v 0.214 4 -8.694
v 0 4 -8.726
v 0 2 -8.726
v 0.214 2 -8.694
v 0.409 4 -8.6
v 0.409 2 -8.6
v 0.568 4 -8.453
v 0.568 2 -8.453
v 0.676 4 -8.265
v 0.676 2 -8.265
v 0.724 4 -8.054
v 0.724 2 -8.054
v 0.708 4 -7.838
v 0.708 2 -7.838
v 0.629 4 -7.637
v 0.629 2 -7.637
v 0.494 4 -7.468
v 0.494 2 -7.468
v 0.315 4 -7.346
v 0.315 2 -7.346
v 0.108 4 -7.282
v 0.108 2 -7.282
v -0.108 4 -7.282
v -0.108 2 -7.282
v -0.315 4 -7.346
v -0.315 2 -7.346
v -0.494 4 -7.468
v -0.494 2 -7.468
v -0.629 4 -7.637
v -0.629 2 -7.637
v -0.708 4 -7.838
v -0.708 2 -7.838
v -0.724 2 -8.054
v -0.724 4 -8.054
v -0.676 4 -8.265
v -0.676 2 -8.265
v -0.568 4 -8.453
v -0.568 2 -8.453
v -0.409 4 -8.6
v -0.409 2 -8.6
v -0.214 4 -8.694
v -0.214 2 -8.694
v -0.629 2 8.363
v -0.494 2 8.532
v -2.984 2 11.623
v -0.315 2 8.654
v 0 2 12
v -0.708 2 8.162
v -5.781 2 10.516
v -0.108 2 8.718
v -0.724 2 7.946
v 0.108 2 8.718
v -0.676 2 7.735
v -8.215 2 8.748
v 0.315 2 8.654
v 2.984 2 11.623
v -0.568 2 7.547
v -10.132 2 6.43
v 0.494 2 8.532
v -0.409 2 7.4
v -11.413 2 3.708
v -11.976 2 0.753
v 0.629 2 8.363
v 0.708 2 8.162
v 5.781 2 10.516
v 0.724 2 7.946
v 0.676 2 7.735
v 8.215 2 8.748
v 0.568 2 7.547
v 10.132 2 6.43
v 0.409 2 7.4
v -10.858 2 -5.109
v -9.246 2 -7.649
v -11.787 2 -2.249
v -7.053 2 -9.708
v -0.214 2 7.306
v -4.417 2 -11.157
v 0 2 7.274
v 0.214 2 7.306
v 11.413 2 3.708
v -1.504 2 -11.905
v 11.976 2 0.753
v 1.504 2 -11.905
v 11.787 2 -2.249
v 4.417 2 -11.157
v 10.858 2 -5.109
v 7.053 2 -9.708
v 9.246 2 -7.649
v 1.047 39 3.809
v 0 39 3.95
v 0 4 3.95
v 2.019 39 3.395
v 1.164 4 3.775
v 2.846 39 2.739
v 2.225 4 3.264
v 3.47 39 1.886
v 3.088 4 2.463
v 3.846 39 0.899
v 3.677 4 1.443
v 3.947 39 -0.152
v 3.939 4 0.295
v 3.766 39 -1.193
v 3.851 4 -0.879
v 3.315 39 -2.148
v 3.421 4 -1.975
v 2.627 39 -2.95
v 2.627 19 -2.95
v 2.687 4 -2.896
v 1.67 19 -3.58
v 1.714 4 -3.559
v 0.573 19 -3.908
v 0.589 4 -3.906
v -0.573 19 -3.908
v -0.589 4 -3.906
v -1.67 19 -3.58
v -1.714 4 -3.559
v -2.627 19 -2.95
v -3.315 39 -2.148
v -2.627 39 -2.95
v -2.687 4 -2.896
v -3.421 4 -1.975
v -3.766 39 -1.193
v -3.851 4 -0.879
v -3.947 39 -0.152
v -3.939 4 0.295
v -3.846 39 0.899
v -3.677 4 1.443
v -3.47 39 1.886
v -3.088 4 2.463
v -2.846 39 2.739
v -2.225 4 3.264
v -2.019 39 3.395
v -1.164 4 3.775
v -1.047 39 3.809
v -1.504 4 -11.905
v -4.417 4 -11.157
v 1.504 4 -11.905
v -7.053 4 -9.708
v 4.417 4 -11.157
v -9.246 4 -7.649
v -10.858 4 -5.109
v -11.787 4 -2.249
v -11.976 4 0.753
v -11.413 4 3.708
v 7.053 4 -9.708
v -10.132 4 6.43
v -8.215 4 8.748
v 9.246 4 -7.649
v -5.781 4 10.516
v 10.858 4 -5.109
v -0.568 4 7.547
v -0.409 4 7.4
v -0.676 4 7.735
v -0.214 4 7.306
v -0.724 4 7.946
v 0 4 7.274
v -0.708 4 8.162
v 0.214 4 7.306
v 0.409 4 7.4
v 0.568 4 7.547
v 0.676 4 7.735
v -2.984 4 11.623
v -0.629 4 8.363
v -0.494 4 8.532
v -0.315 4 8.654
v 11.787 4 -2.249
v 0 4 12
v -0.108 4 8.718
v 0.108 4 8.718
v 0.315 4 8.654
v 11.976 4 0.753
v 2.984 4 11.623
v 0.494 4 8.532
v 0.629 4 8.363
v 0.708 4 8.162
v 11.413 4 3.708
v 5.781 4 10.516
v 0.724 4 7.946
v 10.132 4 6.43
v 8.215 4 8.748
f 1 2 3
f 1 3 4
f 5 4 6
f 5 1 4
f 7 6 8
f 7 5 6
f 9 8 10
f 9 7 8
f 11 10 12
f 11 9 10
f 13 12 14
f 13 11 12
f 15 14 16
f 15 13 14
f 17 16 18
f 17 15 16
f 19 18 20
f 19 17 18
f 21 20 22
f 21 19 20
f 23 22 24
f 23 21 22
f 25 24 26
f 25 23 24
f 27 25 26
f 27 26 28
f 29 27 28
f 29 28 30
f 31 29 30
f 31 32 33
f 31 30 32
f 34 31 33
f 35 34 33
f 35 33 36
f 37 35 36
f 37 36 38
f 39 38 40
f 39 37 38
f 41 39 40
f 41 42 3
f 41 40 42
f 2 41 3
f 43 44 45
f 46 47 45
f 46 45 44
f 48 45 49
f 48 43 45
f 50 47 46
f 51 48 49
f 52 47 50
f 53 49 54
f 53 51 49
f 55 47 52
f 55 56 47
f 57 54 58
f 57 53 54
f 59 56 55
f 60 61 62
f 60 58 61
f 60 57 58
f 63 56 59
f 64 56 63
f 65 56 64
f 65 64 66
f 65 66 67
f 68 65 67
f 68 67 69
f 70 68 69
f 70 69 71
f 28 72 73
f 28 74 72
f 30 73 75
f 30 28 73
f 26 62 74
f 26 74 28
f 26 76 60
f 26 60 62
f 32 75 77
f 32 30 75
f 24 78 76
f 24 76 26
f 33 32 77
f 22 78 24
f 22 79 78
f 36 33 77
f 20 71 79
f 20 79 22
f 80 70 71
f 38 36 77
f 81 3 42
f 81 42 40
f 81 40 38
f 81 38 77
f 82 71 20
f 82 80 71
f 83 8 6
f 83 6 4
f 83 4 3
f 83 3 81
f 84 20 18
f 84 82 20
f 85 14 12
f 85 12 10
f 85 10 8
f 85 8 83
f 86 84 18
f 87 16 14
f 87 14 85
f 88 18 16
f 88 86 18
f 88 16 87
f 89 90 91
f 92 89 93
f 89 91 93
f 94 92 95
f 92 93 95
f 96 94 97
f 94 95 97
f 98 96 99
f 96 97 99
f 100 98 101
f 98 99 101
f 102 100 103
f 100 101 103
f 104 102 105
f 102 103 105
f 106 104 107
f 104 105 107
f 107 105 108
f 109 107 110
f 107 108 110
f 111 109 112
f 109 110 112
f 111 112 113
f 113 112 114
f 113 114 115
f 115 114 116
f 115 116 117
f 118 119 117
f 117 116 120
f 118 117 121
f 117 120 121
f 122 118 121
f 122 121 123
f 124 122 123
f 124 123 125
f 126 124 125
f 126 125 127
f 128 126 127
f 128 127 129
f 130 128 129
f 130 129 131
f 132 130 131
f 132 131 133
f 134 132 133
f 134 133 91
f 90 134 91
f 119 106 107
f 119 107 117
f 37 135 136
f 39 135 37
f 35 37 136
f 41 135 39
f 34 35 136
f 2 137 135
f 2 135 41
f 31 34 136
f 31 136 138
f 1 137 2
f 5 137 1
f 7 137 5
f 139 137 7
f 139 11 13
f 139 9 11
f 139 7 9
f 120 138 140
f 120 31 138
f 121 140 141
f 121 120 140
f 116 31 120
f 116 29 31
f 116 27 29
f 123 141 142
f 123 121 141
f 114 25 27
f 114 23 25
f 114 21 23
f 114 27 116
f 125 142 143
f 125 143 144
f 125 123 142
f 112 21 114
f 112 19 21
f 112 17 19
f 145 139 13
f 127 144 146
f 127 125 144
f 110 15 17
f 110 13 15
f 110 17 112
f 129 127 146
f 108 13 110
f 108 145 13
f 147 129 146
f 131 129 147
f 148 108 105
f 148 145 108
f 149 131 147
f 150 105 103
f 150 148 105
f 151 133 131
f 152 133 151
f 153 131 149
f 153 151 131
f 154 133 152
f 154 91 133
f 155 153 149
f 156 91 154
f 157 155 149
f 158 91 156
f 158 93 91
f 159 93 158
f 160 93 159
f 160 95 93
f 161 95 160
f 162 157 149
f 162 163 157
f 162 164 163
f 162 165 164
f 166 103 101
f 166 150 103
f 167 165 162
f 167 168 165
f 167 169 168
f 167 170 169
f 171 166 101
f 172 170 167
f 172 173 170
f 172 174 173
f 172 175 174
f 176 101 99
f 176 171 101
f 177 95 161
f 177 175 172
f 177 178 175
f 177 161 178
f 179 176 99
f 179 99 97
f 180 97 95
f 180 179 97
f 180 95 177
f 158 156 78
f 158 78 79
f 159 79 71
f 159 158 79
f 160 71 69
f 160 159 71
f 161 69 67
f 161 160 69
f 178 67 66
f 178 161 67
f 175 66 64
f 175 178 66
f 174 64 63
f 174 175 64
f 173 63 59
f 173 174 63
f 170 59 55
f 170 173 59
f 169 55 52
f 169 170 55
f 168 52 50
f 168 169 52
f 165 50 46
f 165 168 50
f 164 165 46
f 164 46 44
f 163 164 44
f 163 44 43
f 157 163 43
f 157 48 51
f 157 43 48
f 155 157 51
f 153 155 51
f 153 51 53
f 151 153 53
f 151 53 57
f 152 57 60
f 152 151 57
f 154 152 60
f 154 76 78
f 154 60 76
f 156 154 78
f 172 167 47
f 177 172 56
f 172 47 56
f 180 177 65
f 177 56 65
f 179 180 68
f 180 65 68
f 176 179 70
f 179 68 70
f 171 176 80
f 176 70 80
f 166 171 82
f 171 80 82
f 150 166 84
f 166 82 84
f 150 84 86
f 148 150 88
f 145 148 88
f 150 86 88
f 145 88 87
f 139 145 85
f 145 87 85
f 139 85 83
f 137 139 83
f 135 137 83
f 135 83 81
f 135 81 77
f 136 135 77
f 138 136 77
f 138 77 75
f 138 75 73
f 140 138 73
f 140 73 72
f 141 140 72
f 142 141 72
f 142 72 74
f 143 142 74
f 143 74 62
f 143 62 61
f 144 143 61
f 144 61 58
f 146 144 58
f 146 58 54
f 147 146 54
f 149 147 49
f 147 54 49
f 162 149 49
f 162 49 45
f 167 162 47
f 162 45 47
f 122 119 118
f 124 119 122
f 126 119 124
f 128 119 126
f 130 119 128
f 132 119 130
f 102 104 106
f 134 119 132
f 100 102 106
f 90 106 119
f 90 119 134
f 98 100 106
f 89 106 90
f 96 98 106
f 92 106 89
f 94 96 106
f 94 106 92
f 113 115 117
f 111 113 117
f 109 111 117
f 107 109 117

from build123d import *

# Parameters (mm, degrees)
CROQUIS3_R                 = 12
SALIENTE_EXTRUIR1_DEPTH    = 4
CROQUIS4_R                 = 3.95
SALIENTE_EXTRUIR2_DEPTH    = 35
CORTAR_EXTRUIR1_START      = -20
CORTAR_EXTRUIR1_DEPTH      = 20
CROQUIS7_R                 = 12
CORTAR_EXTRUIR2_DEPTH      = 2
CORTAR_EXTRUIR3_DEPTH      = 41.706264874
CORTAR_EXTRUIR3_DEPTH_BACK = 41.706264874
CROQUIS8_R                 = 0.726366889


with BuildPart() as part:
    # Croquis3 → Saliente-Extruir1 (new body)
    with BuildSketch(Plane(origin=(0, 0, 0), x_dir=(1, 0, 0), z_dir=(0, 1, 0))):
        with Locations(Location((0, 0, 0), (0, 0, 270))):
            Circle(CROQUIS3_R)
    extrude(amount=SALIENTE_EXTRUIR1_DEPTH)

    # Croquis4 → Saliente-Extruir2 (add)
    with BuildSketch(Plane(origin=(0, 4, 0), x_dir=(1, 0, 0), z_dir=(0, 1, 0))):
        with Locations(Location((0, 0, 0), (0, 0, 270))):
            Circle(CROQUIS4_R)
    extrude(amount=SALIENTE_EXTRUIR2_DEPTH)

    # Croquis5 → Cortar-Extruir1 (cut)
    with BuildSketch(Plane(origin=(0, 39, 0), x_dir=(1, 0, 0), z_dir=(0, 1, 0)).offset(CORTAR_EXTRUIR1_START)):
        with BuildLine():
            Line((2.626785107, 2.95), (-2.626785107, 2.95))
            ThreePointArc((-2.626785107, 2.95), (0, 3.95), (2.626785107, 2.95))
        make_face()
    extrude(amount=CORTAR_EXTRUIR1_DEPTH, mode=Mode.SUBTRACT)

    # Croquis7 → Cortar-Extruir2 (cut)
    with BuildSketch(Plane.XZ):
        with Locations(Location((0, 0, 0), (0, 0, 270))):
            Circle(CROQUIS7_R)
    extrude(amount=-CORTAR_EXTRUIR2_DEPTH, mode=Mode.SUBTRACT)

    # Croquis8 → Cortar-Extruir3 (cut, two sides: drawn at the far end of the back side and taken through both)
    with BuildSketch(Plane.XZ.offset(-2).offset(-CORTAR_EXTRUIR3_DEPTH_BACK)):
        with Locations(Location((0, 8, 0), (0, 0, 270))):
            Circle(CROQUIS8_R)
        with Locations(Location((0, -8, 0), (0, 0, 270))):
            Circle(CROQUIS8_R)
    extrude(amount=CORTAR_EXTRUIR3_DEPTH + CORTAR_EXTRUIR3_DEPTH_BACK, mode=Mode.SUBTRACT)


solid = part.part
